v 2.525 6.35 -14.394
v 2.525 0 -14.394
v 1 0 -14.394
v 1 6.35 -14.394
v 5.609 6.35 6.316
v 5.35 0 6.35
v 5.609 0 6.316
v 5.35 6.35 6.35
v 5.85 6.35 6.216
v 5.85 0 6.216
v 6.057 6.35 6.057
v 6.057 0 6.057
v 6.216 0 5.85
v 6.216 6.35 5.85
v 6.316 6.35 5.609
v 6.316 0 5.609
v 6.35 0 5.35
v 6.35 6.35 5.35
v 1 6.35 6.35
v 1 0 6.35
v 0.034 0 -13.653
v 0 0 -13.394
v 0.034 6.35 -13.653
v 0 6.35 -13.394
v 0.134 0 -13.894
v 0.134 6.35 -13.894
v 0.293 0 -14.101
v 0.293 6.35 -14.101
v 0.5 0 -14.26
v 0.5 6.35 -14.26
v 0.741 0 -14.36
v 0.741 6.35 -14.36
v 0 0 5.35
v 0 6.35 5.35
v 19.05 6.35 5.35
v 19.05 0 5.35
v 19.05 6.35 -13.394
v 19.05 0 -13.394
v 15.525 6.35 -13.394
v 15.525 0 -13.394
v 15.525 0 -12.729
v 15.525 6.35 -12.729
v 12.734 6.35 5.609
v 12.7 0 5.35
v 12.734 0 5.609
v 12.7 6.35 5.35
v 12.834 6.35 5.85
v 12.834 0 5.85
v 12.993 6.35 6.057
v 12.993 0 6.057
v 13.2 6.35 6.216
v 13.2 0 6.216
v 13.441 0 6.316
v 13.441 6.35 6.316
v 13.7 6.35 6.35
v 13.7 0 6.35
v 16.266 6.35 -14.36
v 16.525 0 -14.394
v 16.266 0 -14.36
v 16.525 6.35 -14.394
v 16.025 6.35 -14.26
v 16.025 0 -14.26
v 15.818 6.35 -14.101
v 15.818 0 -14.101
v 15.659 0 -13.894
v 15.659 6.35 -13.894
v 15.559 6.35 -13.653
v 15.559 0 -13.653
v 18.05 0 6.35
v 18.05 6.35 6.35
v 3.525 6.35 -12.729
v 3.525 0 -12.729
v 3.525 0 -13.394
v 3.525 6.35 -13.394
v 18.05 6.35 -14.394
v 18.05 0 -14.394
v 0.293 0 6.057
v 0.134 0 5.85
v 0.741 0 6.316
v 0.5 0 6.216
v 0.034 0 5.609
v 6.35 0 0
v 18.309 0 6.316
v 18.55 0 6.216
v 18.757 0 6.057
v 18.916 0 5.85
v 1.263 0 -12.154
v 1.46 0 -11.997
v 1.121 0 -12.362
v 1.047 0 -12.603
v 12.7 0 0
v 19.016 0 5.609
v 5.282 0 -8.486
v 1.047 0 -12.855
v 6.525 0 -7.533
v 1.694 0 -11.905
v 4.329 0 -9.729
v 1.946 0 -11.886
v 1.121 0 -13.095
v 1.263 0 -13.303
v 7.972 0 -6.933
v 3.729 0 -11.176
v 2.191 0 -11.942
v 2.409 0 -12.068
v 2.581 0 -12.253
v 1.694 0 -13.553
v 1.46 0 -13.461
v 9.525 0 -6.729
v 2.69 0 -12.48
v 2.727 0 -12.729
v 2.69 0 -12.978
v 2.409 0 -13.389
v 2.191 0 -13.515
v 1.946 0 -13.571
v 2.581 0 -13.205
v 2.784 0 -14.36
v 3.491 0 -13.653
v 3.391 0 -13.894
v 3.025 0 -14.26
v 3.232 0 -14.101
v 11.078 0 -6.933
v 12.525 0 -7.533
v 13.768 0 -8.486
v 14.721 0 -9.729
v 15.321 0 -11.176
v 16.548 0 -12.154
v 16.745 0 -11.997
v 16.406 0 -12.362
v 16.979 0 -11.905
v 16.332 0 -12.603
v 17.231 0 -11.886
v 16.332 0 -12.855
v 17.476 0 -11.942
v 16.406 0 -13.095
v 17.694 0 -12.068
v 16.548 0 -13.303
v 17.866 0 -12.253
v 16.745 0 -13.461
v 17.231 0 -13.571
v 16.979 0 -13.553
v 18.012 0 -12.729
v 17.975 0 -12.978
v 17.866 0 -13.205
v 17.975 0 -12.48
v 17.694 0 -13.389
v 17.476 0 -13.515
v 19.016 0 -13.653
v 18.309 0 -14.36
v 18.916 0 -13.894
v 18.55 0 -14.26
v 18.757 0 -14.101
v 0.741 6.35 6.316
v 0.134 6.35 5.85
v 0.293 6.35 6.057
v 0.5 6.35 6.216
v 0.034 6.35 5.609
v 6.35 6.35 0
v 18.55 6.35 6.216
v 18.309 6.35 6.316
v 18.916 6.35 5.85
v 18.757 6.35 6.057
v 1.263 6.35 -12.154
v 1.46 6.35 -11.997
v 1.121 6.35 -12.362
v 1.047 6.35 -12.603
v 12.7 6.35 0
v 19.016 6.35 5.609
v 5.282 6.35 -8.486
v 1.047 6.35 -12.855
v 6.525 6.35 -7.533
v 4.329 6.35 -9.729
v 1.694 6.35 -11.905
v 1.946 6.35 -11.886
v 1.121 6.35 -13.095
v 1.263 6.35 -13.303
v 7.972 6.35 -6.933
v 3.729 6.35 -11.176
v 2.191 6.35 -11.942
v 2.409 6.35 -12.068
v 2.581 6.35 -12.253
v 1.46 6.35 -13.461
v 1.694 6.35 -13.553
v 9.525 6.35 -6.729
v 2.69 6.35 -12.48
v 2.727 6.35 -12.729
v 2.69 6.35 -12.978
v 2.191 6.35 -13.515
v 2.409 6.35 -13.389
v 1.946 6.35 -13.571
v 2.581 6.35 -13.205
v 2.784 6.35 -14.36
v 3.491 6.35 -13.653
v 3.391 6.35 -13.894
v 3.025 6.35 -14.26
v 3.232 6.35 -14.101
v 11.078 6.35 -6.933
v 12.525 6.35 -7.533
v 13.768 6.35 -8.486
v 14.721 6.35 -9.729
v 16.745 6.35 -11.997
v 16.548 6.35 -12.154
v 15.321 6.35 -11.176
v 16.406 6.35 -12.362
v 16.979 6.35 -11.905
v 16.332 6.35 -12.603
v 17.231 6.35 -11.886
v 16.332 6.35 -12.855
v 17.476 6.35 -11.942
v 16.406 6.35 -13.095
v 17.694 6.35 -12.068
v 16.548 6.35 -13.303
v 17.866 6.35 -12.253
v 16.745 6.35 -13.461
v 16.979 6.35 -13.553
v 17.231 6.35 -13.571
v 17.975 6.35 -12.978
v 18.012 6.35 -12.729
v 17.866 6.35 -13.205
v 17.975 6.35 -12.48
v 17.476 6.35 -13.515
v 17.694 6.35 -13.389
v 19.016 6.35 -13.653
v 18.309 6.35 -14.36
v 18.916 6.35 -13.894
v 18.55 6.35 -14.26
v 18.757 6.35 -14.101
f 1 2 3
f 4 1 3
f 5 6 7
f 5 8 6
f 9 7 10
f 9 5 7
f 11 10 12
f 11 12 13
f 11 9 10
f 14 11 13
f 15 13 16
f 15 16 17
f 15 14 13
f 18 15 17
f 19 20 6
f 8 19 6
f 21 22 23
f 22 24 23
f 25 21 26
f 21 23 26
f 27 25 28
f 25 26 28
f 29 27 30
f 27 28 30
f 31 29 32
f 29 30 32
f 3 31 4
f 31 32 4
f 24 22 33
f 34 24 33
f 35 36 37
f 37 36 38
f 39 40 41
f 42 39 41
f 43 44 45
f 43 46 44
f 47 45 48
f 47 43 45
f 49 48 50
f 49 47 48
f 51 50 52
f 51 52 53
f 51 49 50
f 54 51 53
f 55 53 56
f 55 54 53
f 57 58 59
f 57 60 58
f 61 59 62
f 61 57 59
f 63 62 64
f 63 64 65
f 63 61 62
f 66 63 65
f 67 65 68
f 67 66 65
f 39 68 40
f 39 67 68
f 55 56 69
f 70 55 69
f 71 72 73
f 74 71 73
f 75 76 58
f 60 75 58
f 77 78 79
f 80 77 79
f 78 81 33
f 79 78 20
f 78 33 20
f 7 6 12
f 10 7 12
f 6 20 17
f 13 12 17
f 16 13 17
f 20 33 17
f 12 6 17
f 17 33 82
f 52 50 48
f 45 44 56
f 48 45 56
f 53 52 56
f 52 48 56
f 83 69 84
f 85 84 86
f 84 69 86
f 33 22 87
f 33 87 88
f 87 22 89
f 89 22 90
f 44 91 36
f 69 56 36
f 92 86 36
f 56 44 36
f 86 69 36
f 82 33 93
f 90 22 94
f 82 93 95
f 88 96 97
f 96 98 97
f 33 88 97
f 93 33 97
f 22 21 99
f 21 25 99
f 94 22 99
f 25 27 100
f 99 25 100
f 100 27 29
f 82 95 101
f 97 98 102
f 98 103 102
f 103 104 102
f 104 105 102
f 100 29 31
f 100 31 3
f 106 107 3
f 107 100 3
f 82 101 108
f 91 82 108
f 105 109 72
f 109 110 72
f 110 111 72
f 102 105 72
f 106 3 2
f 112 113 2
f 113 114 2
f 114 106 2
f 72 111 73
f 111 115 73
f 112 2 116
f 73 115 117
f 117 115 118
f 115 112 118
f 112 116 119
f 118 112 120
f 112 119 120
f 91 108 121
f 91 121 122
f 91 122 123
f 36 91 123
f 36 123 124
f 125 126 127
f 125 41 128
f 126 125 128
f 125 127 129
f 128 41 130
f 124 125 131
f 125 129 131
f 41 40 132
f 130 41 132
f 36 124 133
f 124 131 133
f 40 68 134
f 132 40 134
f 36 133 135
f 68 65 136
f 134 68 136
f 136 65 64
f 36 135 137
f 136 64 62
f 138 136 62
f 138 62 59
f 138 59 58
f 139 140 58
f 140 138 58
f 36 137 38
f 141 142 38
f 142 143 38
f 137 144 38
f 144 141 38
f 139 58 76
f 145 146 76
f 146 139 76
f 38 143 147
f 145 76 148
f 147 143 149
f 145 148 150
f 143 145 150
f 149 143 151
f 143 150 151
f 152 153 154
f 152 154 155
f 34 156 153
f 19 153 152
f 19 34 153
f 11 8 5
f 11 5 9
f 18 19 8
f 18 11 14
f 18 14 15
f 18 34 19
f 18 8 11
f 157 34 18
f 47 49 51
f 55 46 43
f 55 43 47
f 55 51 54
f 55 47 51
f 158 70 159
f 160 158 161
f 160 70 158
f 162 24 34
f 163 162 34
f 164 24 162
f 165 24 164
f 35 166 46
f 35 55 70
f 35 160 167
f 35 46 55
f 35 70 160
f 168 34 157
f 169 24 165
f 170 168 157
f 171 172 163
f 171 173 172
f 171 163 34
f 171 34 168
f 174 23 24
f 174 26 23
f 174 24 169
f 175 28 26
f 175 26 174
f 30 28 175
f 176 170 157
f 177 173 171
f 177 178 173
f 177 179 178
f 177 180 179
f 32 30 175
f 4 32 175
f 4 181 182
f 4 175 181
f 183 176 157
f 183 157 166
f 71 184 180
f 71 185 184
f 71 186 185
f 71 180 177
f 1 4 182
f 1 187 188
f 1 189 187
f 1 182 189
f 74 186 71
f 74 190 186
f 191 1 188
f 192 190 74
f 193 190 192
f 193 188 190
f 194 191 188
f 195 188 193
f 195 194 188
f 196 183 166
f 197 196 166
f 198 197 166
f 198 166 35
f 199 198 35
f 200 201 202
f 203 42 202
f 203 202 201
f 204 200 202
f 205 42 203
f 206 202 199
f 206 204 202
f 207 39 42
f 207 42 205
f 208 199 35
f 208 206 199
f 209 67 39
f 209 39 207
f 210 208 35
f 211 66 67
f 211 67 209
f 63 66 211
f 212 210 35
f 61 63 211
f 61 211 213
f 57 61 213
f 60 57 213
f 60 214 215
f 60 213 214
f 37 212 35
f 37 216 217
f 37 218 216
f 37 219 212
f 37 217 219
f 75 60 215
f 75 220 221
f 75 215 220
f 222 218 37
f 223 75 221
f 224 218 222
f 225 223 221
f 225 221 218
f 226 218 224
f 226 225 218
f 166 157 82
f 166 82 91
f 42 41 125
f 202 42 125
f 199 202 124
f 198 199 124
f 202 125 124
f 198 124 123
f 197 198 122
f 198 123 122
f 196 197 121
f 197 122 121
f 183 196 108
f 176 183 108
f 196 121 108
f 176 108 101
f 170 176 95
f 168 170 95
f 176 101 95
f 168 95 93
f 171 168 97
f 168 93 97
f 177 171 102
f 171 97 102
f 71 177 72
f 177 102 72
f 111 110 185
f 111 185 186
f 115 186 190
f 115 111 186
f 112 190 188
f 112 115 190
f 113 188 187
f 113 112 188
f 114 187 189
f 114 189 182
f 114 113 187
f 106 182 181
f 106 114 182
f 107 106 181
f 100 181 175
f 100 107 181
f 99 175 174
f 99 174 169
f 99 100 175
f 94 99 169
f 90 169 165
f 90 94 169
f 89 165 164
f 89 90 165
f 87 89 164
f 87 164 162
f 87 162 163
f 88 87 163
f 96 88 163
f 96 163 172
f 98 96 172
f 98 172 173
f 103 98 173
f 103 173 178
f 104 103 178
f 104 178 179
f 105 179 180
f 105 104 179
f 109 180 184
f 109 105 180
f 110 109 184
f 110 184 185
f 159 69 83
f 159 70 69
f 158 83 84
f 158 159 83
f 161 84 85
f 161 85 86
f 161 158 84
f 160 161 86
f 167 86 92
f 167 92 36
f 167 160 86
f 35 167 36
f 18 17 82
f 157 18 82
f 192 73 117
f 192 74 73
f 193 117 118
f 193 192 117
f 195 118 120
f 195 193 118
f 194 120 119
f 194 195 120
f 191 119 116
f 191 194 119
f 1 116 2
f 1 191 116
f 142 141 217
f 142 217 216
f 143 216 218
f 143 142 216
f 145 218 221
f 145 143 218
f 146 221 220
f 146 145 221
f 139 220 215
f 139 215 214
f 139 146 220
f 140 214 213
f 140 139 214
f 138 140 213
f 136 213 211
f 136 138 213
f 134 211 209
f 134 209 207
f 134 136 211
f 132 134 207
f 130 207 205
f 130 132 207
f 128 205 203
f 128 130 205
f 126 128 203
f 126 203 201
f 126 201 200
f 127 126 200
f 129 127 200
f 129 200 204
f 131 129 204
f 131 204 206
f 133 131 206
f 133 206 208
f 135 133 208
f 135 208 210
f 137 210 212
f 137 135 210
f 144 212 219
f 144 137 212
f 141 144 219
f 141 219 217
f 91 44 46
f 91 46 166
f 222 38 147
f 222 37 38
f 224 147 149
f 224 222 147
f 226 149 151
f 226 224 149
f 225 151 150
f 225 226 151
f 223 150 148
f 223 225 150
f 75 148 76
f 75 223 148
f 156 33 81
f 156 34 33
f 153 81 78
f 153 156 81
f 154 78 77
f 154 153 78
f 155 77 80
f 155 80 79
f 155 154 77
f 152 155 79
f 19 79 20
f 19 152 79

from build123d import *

# Parameters (mm, degrees)
SKETCH1_R           = 0.8449945
SKETCH1_W           = 19.05
SKETCH1_H           = 6.0000896
SKETCH1_W_2         = 6.35
SKETCH1_H_2         = 6.35
BOSS_EXTRUDE1_DEPTH = 6.35
FILLET3_R           = 1


with BuildPart() as part:
    # Sketch1 → Boss-Extrude1 (new body)
    with BuildSketch(Plane(origin=(0, 0, 0), x_dir=(1, 0, 0), z_dir=(0, 1, 0))):
        Polygon((0, 14.393729658), (0, 6.0000896), (3.5249993, 6.0000896), (3.5249993, 12.728734258), (3.5249993, 14.393729658), align=None)
        with Locations((1.88250068, 12.728734258)):
            Circle(SKETCH1_R, mode=Mode.SUBTRACT)
        with BuildLine():
            Line((3.5249993, 12.728734258), (3.5249993, 6.0000896))
            Line((3.5249993, 6.0000896), (15.5250007, 6.0000896))
            Line((15.5250007, 6.0000896), (15.5250007, 12.7287274))
            ThreePointArc((15.5250007, 12.7287274), (9.524996571, 6.7287267), (3.5249993, 12.728734258))
        make_face()
        Polygon((15.5250007, 12.7287274), (15.5250007, 6.0000896), (19.05, 6.0000896), (19.05, 14.393729658), (15.5250007, 14.393729658), align=None)
        with Locations((17.16749932, 12.7287274)):
            Circle(SKETCH1_R, mode=Mode.SUBTRACT)
        with Locations((9.525, 3.0000448)):
            Rectangle(SKETCH1_W, SKETCH1_H)
        with Locations((3.175, -3.175)):
            Rectangle(SKETCH1_W_2, SKETCH1_H_2)
        with Locations((15.875, -3.175)):
            Rectangle(SKETCH1_W_2, SKETCH1_H_2)
    extrude(amount=BOSS_EXTRUDE1_DEPTH)

    # Fillet3
    fillet3_edges = [part.edges().sort_by_distance(p)[0] for p in [
        (19.05, 3.175, 6.35),
        (12.7, 3.175, 6.35),
        (6.35, 3.175, 6.35),
        (0, 3.175, 6.35),
        (0, 3.175, -14.393729658),
        (3.5249993, 3.175, -14.393729658),
        (15.5250007, 3.175, -14.393729658),
        (19.05, 3.175, -14.393729658),
    ]]
    fillet(fillet3_edges, radius=FILLET3_R)


solid = part.part
